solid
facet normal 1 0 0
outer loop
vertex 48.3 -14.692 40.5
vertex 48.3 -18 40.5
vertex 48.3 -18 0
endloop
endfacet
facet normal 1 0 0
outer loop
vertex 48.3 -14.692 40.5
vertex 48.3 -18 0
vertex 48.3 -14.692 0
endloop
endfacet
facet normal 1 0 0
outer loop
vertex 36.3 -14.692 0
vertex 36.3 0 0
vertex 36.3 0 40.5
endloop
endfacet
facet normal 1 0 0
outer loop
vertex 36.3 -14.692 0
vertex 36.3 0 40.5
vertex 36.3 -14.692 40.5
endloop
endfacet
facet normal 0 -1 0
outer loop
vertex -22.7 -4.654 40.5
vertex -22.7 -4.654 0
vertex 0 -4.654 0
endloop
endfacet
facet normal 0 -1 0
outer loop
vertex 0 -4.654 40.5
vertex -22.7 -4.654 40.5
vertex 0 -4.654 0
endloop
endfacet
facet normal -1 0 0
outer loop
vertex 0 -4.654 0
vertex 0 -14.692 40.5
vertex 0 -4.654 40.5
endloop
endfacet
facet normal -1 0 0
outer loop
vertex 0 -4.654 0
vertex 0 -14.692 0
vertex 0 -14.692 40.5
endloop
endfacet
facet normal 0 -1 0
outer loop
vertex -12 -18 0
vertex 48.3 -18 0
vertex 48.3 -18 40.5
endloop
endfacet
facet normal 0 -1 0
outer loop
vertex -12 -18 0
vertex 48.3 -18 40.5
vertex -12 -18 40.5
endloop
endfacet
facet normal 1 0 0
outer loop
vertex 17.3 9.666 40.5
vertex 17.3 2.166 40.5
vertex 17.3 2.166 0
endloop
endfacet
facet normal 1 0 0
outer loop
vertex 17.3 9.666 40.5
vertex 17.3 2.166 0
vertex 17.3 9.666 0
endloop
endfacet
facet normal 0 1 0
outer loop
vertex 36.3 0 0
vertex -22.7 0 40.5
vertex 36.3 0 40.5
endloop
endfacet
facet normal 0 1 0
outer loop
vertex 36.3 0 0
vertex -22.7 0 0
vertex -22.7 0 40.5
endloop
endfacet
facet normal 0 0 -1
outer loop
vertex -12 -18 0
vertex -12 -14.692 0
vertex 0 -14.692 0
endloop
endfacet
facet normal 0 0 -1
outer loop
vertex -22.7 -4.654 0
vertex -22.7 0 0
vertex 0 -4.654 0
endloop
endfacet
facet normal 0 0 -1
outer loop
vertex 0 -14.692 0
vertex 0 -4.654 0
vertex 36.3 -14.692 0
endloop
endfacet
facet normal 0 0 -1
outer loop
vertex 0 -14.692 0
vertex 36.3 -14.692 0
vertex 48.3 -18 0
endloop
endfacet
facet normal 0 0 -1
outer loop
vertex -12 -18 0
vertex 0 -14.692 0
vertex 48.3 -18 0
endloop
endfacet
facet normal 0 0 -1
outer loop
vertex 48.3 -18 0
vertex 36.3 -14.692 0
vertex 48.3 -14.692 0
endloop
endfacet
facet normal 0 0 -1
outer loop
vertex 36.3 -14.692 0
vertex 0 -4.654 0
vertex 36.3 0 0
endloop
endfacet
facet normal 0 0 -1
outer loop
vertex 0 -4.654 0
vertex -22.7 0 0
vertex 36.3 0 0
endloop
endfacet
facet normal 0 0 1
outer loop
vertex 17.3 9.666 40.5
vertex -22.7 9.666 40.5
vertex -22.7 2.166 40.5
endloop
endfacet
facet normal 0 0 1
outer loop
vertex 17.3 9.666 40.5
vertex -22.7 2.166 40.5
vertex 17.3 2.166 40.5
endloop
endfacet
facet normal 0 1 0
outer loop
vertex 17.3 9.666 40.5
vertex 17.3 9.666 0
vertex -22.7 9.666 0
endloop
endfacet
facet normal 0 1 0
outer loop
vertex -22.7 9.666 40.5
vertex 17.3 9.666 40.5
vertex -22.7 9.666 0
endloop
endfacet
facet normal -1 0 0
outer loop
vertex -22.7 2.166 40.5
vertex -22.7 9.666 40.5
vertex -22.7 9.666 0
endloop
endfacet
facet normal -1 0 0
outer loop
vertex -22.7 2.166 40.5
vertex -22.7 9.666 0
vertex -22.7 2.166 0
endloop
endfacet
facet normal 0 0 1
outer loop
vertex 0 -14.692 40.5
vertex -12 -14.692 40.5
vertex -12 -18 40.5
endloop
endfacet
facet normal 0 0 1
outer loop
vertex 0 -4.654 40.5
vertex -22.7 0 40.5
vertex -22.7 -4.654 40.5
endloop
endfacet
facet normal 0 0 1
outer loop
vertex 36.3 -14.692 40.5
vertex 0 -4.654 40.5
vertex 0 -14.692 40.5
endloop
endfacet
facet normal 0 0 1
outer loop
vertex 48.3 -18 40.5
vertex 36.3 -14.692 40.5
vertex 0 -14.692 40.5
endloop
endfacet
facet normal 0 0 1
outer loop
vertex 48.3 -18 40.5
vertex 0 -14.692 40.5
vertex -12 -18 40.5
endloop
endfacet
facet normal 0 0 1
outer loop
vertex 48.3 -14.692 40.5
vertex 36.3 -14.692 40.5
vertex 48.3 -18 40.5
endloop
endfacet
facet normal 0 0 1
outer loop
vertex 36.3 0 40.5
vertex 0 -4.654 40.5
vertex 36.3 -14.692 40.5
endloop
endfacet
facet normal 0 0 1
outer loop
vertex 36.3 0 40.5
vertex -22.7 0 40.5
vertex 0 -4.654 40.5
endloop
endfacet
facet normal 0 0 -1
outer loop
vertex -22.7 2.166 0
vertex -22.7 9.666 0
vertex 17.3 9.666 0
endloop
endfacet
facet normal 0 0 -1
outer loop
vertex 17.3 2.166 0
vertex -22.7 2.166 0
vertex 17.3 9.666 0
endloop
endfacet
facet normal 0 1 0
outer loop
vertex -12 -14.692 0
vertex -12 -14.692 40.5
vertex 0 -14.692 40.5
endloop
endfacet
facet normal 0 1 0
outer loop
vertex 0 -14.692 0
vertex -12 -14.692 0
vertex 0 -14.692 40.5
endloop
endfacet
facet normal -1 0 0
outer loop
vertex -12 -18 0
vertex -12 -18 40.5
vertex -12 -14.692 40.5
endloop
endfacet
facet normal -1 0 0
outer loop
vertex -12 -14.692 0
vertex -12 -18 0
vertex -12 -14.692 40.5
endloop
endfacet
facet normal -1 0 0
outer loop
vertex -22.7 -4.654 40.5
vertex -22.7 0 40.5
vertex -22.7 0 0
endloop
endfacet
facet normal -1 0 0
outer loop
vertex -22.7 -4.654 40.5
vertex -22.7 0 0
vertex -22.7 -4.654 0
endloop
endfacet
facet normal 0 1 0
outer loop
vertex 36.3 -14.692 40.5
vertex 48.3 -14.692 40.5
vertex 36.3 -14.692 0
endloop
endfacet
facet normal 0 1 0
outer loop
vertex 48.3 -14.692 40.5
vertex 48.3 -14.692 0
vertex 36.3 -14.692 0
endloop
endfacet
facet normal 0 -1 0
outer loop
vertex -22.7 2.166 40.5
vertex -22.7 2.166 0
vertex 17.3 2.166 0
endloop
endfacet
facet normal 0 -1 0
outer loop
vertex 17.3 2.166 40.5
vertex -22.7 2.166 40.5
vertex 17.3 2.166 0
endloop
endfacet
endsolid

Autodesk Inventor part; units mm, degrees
ref_plane "YZ Plane" through (0, 0, 0) normal (1, 0, 0) x (0, 1, 0)
ref_plane "XZ Plane" through (0, 0, 0) normal (0, 1, 0) x (-1, 0, 0)
ref_plane "XY Plane" through (0, 0, 0) normal (0, 0, 1) x (1, 0, 0)
sketch "Sketch1" plane through (0, 0, 0) normal (0, 0, 1) x (1, 0, 0)
  line L0 (0, 0) -> (36.3, 0)
  line L1 (36.3, 0) -> (36.3, -18)
  line L2 (36.3, -18) -> (0, -18)
  line L3 (0, -18) -> (0, 0)
  line L4 (-22.7, 2.1663) -> (17.3, 2.1663)
  line L5 (17.3, 2.1663) -> (17.3, 9.6663)
  line L6 (17.3, 9.6663) -> (-22.7, 9.6663)
  line L7 (-22.7, 9.6663) -> (-22.7, 2.1663)
  line L8 (-22.7, -4.6543) -> (0, -4.6543)
  line L9 (0, -4.6543) -> (0, 0)
  line L10 (0, 0) -> (-22.7, 0)
  line L11 (-22.7, 0) -> (-22.7, -4.6543)
  line L12 (36.3, -18) -> (48.3, -18)
  line L13 (48.3, -18) -> (48.3, -14.6921)
  line L14 (48.3, -14.6921) -> (36.3, -14.6921)
  line L15 (36.3, -14.6921) -> (36.3, -18)
  line L16 (0, -18) -> (-12, -18)
  line L17 (-12, -18) -> (-12, -14.6921)
  line L18 (-12, -14.6921) -> (0, -14.6921)
  line L19 (0, -14.6921) -> (0, -18)
  dimension "d0" = 36.3
  dimension "d1" = 18
  dimension "d2" = 40
  dimension "d3" = 7.5
  dimension "d4" = 59
  dimension "d5" = 71
extrude "Extrusion1" add sketch "Sketch1" along normal blind 40.5
properties part number "TeensyBLENunchukBundle"
